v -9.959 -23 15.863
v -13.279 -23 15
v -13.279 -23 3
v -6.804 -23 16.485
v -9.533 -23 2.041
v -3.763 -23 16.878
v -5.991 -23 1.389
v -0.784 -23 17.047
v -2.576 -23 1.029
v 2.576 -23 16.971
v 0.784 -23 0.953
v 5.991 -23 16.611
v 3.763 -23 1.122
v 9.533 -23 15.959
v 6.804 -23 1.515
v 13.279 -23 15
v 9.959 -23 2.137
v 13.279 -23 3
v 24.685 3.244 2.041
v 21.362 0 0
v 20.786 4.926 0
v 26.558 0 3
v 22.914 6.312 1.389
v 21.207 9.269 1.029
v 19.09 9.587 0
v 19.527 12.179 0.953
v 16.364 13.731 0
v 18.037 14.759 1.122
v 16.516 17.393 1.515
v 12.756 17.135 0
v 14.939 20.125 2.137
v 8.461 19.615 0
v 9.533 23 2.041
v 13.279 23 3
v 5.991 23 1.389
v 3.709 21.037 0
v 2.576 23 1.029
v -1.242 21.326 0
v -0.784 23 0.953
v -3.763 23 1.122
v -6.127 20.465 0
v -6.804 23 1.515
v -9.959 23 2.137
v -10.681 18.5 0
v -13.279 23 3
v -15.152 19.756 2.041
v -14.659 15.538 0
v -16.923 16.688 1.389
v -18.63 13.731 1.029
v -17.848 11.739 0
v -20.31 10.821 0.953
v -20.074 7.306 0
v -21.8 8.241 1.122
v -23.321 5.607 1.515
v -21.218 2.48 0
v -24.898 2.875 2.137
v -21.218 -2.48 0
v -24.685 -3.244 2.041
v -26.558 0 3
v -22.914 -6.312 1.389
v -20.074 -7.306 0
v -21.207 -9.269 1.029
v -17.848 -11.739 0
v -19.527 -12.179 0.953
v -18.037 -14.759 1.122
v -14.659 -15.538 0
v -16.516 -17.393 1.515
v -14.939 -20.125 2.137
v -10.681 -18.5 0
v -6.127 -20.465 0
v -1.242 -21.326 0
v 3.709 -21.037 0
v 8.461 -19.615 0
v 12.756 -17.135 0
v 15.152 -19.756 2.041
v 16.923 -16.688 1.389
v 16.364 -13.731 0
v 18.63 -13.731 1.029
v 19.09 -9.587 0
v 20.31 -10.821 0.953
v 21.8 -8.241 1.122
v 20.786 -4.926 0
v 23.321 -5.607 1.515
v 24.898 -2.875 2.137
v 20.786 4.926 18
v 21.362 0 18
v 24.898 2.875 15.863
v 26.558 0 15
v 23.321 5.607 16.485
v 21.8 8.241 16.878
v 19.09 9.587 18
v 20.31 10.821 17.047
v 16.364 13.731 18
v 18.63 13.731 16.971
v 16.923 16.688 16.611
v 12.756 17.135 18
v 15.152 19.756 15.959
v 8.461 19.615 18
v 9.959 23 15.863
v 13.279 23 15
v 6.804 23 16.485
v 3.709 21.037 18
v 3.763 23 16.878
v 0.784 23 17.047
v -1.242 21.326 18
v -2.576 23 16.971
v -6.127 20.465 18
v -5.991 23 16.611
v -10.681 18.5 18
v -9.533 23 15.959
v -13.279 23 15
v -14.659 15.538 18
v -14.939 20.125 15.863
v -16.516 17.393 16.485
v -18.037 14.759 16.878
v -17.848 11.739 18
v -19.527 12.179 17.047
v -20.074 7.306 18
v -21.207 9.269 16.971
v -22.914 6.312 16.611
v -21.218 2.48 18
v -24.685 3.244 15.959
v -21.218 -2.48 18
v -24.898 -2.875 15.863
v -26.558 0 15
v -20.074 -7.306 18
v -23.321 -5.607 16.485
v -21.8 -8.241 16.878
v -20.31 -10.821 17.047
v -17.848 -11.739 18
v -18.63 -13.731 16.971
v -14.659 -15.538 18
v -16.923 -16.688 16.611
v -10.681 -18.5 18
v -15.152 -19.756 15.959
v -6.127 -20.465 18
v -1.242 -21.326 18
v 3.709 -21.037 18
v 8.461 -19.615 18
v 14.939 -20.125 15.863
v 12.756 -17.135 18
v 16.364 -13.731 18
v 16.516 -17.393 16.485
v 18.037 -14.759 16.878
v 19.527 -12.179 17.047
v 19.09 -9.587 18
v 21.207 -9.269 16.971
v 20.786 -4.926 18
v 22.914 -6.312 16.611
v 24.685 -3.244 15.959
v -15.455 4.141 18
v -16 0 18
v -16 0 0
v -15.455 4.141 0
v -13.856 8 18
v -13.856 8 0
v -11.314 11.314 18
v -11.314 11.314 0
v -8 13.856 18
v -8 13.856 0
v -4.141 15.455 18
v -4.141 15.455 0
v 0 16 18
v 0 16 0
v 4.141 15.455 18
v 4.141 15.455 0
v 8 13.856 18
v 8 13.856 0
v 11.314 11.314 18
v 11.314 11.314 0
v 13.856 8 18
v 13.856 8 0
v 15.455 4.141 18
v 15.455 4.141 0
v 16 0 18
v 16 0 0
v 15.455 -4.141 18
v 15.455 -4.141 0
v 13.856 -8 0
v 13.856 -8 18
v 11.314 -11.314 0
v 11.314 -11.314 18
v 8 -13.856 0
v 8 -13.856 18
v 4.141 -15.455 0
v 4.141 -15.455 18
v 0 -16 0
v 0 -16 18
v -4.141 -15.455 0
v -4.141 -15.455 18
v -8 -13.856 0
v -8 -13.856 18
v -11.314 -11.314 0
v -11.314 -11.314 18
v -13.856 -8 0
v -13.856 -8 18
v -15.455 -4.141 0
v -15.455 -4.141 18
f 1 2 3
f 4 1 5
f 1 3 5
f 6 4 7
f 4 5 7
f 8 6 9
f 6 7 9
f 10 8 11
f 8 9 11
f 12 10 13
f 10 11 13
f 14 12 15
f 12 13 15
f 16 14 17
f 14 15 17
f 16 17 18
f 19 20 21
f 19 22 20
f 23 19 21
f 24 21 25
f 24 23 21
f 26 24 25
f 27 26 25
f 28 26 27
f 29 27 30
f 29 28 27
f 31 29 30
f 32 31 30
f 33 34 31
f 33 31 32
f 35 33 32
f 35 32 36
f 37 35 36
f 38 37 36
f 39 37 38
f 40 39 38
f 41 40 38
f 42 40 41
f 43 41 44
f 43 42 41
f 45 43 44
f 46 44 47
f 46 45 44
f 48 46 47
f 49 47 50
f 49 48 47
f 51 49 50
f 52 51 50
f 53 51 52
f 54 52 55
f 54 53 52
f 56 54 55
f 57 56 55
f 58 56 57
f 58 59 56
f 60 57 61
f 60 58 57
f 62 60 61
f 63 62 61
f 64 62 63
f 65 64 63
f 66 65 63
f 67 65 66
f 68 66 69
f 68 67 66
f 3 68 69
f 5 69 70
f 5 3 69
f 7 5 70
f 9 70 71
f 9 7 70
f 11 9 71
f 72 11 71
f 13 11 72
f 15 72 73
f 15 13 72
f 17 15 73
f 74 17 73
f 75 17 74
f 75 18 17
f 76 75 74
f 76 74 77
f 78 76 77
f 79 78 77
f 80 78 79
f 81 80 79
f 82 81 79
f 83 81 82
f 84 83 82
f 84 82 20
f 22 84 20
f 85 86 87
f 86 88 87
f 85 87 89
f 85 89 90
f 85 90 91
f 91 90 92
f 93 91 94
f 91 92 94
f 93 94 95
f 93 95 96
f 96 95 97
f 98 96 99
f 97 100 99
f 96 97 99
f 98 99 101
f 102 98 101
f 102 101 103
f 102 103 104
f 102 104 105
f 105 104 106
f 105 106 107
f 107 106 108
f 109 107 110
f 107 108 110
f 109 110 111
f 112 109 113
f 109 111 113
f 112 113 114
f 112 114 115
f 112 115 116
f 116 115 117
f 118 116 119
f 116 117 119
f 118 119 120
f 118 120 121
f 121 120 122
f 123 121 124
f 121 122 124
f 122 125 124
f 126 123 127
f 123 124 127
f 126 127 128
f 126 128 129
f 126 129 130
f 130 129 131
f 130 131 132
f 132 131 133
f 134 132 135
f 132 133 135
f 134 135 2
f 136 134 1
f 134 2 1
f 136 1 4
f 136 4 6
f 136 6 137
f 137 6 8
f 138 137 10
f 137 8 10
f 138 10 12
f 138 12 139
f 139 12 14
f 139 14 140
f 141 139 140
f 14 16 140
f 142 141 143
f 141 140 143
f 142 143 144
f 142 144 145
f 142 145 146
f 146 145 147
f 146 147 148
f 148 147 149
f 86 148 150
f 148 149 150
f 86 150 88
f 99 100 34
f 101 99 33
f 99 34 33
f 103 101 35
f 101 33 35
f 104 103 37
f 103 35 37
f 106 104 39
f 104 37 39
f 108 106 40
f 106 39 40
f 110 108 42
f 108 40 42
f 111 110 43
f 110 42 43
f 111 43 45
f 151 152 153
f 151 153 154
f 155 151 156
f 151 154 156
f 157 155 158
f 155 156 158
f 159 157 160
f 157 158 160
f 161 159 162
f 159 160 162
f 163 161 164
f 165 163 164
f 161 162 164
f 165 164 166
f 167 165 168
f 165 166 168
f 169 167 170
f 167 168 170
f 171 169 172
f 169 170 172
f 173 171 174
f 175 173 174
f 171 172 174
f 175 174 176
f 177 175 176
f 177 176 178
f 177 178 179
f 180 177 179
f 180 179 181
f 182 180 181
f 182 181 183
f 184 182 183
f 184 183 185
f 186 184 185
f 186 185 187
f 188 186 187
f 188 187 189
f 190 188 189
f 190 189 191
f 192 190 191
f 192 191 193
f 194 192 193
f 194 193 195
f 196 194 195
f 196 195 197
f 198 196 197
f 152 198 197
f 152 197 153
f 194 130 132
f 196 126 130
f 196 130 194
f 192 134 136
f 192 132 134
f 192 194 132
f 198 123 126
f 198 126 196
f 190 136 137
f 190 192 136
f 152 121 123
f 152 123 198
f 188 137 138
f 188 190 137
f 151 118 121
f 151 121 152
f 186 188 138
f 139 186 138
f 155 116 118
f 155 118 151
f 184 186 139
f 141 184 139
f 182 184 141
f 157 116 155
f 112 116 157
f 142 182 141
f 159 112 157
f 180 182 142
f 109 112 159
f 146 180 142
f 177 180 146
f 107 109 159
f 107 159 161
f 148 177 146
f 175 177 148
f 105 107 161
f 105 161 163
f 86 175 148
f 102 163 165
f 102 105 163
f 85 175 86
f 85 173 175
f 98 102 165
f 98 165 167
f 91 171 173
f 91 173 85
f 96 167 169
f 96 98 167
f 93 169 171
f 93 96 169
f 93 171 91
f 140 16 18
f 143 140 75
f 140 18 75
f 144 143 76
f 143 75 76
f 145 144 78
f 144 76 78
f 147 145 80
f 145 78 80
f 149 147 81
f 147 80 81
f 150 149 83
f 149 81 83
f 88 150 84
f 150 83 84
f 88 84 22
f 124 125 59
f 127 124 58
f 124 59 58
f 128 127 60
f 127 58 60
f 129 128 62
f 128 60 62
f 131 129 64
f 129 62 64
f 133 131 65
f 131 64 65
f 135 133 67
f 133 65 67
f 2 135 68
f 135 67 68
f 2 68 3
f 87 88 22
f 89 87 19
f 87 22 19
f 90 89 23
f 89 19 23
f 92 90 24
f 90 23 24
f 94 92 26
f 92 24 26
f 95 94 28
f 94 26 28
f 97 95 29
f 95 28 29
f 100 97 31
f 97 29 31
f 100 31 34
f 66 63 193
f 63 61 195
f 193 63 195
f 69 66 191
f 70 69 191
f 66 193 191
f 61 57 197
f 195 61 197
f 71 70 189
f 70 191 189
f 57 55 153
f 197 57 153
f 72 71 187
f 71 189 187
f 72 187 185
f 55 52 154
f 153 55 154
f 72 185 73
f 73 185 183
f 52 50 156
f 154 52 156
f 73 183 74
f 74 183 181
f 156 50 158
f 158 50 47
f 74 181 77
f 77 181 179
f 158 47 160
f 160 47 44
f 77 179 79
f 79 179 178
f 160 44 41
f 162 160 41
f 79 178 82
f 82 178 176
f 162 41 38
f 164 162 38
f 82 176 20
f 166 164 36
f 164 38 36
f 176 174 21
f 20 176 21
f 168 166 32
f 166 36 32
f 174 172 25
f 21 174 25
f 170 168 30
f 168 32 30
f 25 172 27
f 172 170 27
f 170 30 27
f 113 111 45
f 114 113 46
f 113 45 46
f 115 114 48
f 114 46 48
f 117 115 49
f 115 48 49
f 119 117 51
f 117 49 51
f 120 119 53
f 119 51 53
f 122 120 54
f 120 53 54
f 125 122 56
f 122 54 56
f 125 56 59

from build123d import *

# Parameters (mm, degrees)
EXTRUDE_1_DEPTH = 18
M20X2_5_1_D     = 32
M20X2_5_1_DEPTH = 47.5
M20X2_5_1_TIP   = 9.613769904


with BuildPart() as part:
    # 草图1 → 拉伸1 (new body)
    with BuildSketch(Plane.XY):
        Polygon((26.558112383, 0), (13.279056191, 23), (-13.279056191, 23), (-26.558112383, 0), (-13.279056191, -23), (13.279056191, -23), align=None)
    extrude(amount=EXTRUDE_1_DEPTH)

    # 草图2 → 切除-旋转1 (revolve, cut)
    with BuildSketch(Plane(origin=(0, 0, 0), x_dir=(1, 0, 0), z_dir=(0, 1, 0))):
        Polygon((4.209845782, 9.902777738), (26.558112383, -3), (32.141291251, 6.670349468), align=None)
        Polygon((26.558112383, -15), (32.141291251, -24.670349468), (4.209845782, -27.902777738), align=None)
    revolve(axis=Axis((0, 0, -13.306273389), (0, 0, 1)), mode=Mode.SUBTRACT)

    # M20x2.5 螺纹孔1
    with Locations(Plane.XY.offset(18)):
        with Locations((0, 0)):
            Hole(M20X2_5_1_D / 2, depth=M20X2_5_1_DEPTH)
            with Locations((0, 0, -(M20X2_5_1_DEPTH + M20X2_5_1_TIP / 2))):  # 118° drill point
                Cone(0, M20X2_5_1_D / 2, M20X2_5_1_TIP, mode=Mode.SUBTRACT)


solid = part.part
